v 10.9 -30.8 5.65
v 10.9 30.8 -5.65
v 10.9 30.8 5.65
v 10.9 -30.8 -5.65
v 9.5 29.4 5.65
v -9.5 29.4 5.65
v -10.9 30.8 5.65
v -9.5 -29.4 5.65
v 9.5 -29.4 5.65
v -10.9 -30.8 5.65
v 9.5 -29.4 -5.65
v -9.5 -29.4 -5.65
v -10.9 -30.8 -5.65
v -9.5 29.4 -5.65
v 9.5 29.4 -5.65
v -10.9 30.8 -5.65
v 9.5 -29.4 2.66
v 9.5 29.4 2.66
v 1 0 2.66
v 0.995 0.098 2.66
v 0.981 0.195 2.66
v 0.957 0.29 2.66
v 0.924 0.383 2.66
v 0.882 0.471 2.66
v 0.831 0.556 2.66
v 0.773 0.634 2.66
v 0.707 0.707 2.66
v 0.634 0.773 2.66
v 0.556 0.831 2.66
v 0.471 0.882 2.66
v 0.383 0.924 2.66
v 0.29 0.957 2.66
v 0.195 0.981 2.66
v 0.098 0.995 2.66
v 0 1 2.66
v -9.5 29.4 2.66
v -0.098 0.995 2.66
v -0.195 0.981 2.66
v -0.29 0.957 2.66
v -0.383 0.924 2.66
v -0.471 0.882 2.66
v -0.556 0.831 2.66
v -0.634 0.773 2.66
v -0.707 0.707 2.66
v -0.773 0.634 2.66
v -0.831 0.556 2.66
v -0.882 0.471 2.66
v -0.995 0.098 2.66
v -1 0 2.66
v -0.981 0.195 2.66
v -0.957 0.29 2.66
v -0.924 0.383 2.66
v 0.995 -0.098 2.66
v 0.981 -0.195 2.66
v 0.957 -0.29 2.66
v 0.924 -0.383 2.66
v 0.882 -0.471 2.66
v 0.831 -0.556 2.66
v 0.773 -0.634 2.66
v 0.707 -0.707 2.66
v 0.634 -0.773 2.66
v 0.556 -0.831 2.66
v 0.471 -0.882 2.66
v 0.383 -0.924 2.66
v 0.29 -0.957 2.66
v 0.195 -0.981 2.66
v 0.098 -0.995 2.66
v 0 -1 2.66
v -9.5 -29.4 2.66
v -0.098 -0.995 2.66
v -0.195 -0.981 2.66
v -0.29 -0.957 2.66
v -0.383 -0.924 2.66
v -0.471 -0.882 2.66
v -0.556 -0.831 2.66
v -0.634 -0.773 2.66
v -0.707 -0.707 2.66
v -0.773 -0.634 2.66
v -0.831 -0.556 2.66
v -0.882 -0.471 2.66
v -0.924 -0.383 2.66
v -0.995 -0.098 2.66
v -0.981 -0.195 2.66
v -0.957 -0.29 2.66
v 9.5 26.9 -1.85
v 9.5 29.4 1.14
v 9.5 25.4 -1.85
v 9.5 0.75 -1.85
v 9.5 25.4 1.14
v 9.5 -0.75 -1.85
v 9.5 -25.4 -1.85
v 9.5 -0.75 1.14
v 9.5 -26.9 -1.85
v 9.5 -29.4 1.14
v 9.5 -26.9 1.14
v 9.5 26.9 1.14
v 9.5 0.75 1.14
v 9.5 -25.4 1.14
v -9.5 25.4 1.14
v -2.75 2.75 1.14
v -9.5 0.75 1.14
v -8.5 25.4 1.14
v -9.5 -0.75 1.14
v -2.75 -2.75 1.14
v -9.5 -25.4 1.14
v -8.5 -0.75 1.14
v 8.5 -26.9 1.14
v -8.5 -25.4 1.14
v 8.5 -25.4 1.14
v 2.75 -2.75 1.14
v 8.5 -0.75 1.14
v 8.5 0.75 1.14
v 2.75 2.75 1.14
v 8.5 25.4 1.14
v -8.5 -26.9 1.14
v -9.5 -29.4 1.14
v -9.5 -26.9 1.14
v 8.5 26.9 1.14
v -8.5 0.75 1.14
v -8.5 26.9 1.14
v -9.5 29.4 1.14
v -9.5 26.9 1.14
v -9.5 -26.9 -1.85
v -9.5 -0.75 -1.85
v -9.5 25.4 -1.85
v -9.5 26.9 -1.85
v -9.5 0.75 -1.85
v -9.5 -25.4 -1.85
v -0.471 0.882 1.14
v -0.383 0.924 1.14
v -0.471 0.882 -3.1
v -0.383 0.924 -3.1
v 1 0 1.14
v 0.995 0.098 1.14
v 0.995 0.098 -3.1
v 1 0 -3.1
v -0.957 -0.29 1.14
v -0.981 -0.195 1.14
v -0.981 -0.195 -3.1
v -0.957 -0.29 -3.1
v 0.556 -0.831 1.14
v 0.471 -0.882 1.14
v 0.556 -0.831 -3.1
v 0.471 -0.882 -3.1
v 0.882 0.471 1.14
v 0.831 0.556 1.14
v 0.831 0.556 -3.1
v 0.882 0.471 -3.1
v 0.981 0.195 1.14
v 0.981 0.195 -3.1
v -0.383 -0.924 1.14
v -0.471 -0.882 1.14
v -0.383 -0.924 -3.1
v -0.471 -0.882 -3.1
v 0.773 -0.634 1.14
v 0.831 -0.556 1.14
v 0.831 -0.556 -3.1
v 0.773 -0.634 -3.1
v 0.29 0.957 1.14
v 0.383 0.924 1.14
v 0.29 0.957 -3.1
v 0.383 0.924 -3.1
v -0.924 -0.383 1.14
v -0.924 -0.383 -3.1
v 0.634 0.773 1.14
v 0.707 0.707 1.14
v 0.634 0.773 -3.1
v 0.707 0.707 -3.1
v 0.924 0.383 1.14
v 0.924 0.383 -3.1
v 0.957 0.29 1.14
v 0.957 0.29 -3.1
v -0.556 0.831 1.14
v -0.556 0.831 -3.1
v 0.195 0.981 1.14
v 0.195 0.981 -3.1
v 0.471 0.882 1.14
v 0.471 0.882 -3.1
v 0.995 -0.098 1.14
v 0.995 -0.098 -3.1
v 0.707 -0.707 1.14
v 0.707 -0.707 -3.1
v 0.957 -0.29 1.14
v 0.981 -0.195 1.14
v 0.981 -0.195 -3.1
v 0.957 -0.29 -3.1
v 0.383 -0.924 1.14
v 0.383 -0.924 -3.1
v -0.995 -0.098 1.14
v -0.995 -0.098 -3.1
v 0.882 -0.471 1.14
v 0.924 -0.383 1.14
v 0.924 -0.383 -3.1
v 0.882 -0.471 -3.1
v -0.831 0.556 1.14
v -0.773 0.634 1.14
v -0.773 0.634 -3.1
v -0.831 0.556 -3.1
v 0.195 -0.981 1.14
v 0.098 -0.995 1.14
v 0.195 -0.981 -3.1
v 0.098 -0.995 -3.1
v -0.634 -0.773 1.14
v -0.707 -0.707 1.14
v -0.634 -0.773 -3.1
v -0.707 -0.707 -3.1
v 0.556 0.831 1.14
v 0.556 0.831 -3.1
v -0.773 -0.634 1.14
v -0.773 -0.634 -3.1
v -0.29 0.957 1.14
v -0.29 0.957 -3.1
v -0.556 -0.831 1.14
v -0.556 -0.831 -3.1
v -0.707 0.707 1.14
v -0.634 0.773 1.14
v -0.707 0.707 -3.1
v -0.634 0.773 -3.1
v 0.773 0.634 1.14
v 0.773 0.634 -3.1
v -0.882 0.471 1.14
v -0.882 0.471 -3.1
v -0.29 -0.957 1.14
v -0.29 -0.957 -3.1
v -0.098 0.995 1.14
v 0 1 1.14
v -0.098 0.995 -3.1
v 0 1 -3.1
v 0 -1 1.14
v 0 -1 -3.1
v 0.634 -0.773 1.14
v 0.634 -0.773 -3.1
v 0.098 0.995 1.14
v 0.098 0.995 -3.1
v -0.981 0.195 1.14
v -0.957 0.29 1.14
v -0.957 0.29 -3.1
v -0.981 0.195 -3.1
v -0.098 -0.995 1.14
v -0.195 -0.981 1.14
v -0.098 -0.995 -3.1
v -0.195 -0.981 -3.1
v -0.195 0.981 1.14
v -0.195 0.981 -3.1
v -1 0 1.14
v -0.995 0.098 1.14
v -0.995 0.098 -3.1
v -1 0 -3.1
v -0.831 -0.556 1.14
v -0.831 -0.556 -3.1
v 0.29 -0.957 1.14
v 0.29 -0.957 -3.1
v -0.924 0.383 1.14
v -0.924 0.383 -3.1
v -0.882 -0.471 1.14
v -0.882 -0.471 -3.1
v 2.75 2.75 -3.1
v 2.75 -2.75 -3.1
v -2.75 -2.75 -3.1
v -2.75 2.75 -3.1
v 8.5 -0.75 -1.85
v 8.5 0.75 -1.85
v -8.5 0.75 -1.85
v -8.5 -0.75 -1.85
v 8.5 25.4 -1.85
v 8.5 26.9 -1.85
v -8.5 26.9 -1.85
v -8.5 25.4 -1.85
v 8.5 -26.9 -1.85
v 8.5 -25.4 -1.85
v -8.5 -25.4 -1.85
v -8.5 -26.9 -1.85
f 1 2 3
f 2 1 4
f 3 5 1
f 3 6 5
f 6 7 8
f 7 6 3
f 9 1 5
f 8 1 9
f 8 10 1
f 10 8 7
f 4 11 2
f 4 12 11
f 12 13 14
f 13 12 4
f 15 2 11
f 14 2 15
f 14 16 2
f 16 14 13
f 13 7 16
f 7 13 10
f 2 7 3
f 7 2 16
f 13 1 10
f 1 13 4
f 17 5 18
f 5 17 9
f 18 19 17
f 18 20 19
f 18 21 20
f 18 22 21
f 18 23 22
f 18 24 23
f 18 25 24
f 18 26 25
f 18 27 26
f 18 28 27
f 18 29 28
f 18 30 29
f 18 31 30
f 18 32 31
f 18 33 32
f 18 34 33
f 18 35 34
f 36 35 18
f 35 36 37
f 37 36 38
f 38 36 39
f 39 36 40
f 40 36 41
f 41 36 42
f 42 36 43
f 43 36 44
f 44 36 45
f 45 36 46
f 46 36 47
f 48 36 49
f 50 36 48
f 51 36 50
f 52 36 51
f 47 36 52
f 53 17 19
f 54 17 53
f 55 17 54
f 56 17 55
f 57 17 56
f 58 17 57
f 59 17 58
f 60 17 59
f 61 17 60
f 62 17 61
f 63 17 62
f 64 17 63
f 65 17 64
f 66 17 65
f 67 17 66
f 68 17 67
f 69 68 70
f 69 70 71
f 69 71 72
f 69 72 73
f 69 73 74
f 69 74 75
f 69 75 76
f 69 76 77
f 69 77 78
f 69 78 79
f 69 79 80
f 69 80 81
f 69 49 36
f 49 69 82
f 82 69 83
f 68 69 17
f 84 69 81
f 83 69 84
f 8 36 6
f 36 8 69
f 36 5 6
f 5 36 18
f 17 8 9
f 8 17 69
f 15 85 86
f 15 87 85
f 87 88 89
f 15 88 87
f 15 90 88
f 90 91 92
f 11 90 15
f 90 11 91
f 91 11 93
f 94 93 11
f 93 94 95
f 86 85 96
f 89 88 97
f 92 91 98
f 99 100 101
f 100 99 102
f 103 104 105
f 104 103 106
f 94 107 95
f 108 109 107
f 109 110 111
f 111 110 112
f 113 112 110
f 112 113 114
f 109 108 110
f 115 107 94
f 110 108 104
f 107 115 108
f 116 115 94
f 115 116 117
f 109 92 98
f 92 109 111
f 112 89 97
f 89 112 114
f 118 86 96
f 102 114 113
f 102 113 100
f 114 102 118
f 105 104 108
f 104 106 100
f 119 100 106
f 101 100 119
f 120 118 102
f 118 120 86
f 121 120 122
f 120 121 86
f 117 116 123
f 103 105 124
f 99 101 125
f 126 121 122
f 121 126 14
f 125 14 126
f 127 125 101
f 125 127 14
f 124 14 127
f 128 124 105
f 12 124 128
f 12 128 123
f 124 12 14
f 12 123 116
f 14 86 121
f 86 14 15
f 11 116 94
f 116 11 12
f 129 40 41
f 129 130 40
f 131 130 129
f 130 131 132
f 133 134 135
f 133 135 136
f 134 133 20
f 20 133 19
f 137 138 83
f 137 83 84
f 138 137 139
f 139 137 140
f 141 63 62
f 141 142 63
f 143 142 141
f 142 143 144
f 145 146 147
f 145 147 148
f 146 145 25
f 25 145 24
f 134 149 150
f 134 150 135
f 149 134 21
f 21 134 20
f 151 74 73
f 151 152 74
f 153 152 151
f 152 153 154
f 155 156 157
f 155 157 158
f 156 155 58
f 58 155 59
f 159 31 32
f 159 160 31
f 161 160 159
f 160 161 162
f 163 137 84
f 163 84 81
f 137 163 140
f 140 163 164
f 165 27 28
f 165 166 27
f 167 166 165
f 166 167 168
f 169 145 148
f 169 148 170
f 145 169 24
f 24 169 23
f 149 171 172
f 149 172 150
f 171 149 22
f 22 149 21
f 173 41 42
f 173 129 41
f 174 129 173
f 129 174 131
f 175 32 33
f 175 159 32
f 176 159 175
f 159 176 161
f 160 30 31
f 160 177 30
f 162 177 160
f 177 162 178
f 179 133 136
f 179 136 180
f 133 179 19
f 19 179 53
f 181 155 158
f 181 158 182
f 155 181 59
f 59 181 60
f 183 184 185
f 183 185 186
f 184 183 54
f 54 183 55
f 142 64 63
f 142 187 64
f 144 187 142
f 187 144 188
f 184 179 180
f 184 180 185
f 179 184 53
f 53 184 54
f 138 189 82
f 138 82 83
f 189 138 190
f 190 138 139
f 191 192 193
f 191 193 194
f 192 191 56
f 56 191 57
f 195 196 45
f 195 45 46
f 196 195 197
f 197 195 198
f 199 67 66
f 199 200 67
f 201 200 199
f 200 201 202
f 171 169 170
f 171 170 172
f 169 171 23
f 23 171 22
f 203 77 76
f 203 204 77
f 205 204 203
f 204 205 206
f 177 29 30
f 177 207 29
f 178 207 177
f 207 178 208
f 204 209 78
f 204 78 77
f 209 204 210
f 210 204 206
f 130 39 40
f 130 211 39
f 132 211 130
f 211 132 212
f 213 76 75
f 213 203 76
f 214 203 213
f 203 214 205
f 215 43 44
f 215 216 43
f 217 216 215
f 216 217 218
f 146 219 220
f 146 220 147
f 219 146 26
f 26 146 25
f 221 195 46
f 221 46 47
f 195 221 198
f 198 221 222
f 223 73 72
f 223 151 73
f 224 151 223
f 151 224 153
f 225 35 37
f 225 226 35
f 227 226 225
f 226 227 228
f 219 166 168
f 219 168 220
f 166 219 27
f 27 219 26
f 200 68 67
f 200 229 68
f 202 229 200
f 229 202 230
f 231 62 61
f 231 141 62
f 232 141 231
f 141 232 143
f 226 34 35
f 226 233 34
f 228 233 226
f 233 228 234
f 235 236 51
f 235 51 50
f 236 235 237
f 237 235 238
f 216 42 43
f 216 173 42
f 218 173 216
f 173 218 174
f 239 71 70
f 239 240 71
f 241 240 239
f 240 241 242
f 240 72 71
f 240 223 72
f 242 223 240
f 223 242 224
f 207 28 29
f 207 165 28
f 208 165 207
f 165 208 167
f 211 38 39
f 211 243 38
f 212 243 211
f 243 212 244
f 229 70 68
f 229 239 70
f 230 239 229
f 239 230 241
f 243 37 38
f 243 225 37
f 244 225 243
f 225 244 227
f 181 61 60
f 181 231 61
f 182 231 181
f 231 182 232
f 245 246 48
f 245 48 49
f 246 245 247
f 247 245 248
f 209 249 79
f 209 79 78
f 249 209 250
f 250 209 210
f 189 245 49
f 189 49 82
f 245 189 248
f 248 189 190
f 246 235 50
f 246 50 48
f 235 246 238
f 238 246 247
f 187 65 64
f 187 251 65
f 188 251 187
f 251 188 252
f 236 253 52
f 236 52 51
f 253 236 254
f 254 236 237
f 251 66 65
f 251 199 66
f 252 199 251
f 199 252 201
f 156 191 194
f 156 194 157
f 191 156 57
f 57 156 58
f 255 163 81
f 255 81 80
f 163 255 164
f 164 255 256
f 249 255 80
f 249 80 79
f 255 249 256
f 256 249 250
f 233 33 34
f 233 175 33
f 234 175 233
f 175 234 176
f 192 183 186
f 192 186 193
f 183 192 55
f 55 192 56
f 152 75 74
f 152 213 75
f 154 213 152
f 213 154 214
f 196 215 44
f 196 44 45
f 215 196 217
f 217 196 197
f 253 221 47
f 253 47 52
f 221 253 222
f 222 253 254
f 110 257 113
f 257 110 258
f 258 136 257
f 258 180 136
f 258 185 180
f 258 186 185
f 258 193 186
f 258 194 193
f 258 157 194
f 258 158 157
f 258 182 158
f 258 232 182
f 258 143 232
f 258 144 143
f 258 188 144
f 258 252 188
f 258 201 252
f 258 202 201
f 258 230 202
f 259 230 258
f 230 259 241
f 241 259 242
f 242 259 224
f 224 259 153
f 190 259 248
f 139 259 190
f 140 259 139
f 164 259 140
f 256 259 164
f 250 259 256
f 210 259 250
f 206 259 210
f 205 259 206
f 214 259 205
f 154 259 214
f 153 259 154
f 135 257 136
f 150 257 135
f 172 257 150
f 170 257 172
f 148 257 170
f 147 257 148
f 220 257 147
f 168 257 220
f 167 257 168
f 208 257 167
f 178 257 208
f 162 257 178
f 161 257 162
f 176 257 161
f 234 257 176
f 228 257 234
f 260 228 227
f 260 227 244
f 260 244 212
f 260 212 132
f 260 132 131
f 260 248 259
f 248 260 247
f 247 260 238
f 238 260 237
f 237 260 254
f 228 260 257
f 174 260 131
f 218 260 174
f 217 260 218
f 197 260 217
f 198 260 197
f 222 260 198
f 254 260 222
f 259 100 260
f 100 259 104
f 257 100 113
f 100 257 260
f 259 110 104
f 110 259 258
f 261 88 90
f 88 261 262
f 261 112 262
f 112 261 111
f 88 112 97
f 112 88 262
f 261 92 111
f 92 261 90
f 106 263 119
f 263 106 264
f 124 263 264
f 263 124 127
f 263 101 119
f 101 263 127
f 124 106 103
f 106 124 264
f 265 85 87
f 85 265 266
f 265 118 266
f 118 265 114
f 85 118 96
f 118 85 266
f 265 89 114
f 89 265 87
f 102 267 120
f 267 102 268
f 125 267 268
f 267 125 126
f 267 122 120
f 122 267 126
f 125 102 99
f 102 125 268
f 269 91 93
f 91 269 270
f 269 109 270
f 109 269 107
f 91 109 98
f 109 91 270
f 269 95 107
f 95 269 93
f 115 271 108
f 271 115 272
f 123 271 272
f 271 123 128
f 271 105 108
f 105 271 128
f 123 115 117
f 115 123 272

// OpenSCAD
// 5 hoch
//19 breit
//58.8 lang
// 2mm loch in der mitte in deiner mindest. 5mm säule mitz finnen
// an der mitten seite 1.5 breite finnen beginened 4mm von unterkante
// s#äul bewginnt zwei mm von unterkante
// 2.5 von ausskannte extra finnem
holedia=2;
innerlen=58.8;
innerwidth=19;
wallw=1.4;
outerlen=innerlen+wallw*2;
outerwidth=innerwidth+wallw*2;
topwallh=1.5;

topouteredge=3;
minhfcarbottom=5;
carbottomh=2.5;
lowouterhang=0.8;
outerheight=topouteredge+minhfcarbottom+carbottomh+lowouterhang;
lowcuth=outerheight-topouteredge-topwallh;//cut from bottom
finw=1.5;//finnwidth
findepth=1;//finndepth
finofs=3.8;//finnofset from ground
dcolh=lowcuth-2.5; //center col height
finh=lowcuth;
outerfinofs=2.5;

columnw=5.5; //5 org
echo(outerheight);


traintop();

module traintop(){
    smi=0.01;
    xa=0.2;   
    bofs=lowouterhang+carbottomh;  
    
    difference(){    
        cube([outerwidth,outerlen,outerheight],center=true);        
        //topcut
        translate([0,0,outerheight/2-topouteredge/2+smi])
            cube([innerwidth,innerlen,topouteredge],center=true);
        //bottomcut        
     
            translate([0,0,-outerheight/2+lowcuth/2-smi]) 
                cube([innerwidth,innerlen,lowcuth],center=true);     
      
        //central hole
       translate([0,0,-outerheight/2-0.5])
           cylinder(d=holedia,h=outerheight*1.1,$fn=64);
    }
    //add middle finns    
    translate([innerwidth/2-findepth/2,0,-outerheight/2+lowcuth/2+finofs/2])
        cube([findepth,finw,finh-finofs],center=true);
    
    translate([-innerwidth/2+findepth/2,0,-outerheight/2+lowcuth/2+finofs/2])
        cube([findepth,finw,finh-finofs],center=true);
    // add fins there
    translate([innerwidth/2-findepth/2,innerlen/2-outerfinofs-finw/2,-outerheight/2+lowcuth/2+finofs/2])
        cube([findepth,finw,finh-finofs],center=true);
    
    translate([-innerwidth/2+findepth/2,innerlen/2-outerfinofs-finw/2,-outerheight/2+lowcuth/2+finofs/2])
        cube([findepth,finw,finh-finofs],center=true);
    
    // and add fins thore
    translate([innerwidth/2-findepth/2,-innerlen/2+outerfinofs+finw/2,-outerheight/2+lowcuth/2+finofs/2])
        cube([findepth,finw,finh-finofs],center=true);
    
    translate([-innerwidth/2+findepth/2,-innerlen/2+outerfinofs+finw/2,-outerheight/2+lowcuth/2+finofs/2])
        cube([findepth,finw,finh-finofs],center=true);
    
    //centercolumn                
    
    difference(){
        translate([0,0,-outerheight/2+dcolh+0.4]) 
            cube([columnw,columnw,dcolh],center=true);
        translate([0,0,-outerheight/2-0.5])
           cylinder(d=holedia,h=outerheight*1.1,$fn=64);
    }
         
    //translate([0,0,-outerheight/2+lowcuth/2])
    
}
